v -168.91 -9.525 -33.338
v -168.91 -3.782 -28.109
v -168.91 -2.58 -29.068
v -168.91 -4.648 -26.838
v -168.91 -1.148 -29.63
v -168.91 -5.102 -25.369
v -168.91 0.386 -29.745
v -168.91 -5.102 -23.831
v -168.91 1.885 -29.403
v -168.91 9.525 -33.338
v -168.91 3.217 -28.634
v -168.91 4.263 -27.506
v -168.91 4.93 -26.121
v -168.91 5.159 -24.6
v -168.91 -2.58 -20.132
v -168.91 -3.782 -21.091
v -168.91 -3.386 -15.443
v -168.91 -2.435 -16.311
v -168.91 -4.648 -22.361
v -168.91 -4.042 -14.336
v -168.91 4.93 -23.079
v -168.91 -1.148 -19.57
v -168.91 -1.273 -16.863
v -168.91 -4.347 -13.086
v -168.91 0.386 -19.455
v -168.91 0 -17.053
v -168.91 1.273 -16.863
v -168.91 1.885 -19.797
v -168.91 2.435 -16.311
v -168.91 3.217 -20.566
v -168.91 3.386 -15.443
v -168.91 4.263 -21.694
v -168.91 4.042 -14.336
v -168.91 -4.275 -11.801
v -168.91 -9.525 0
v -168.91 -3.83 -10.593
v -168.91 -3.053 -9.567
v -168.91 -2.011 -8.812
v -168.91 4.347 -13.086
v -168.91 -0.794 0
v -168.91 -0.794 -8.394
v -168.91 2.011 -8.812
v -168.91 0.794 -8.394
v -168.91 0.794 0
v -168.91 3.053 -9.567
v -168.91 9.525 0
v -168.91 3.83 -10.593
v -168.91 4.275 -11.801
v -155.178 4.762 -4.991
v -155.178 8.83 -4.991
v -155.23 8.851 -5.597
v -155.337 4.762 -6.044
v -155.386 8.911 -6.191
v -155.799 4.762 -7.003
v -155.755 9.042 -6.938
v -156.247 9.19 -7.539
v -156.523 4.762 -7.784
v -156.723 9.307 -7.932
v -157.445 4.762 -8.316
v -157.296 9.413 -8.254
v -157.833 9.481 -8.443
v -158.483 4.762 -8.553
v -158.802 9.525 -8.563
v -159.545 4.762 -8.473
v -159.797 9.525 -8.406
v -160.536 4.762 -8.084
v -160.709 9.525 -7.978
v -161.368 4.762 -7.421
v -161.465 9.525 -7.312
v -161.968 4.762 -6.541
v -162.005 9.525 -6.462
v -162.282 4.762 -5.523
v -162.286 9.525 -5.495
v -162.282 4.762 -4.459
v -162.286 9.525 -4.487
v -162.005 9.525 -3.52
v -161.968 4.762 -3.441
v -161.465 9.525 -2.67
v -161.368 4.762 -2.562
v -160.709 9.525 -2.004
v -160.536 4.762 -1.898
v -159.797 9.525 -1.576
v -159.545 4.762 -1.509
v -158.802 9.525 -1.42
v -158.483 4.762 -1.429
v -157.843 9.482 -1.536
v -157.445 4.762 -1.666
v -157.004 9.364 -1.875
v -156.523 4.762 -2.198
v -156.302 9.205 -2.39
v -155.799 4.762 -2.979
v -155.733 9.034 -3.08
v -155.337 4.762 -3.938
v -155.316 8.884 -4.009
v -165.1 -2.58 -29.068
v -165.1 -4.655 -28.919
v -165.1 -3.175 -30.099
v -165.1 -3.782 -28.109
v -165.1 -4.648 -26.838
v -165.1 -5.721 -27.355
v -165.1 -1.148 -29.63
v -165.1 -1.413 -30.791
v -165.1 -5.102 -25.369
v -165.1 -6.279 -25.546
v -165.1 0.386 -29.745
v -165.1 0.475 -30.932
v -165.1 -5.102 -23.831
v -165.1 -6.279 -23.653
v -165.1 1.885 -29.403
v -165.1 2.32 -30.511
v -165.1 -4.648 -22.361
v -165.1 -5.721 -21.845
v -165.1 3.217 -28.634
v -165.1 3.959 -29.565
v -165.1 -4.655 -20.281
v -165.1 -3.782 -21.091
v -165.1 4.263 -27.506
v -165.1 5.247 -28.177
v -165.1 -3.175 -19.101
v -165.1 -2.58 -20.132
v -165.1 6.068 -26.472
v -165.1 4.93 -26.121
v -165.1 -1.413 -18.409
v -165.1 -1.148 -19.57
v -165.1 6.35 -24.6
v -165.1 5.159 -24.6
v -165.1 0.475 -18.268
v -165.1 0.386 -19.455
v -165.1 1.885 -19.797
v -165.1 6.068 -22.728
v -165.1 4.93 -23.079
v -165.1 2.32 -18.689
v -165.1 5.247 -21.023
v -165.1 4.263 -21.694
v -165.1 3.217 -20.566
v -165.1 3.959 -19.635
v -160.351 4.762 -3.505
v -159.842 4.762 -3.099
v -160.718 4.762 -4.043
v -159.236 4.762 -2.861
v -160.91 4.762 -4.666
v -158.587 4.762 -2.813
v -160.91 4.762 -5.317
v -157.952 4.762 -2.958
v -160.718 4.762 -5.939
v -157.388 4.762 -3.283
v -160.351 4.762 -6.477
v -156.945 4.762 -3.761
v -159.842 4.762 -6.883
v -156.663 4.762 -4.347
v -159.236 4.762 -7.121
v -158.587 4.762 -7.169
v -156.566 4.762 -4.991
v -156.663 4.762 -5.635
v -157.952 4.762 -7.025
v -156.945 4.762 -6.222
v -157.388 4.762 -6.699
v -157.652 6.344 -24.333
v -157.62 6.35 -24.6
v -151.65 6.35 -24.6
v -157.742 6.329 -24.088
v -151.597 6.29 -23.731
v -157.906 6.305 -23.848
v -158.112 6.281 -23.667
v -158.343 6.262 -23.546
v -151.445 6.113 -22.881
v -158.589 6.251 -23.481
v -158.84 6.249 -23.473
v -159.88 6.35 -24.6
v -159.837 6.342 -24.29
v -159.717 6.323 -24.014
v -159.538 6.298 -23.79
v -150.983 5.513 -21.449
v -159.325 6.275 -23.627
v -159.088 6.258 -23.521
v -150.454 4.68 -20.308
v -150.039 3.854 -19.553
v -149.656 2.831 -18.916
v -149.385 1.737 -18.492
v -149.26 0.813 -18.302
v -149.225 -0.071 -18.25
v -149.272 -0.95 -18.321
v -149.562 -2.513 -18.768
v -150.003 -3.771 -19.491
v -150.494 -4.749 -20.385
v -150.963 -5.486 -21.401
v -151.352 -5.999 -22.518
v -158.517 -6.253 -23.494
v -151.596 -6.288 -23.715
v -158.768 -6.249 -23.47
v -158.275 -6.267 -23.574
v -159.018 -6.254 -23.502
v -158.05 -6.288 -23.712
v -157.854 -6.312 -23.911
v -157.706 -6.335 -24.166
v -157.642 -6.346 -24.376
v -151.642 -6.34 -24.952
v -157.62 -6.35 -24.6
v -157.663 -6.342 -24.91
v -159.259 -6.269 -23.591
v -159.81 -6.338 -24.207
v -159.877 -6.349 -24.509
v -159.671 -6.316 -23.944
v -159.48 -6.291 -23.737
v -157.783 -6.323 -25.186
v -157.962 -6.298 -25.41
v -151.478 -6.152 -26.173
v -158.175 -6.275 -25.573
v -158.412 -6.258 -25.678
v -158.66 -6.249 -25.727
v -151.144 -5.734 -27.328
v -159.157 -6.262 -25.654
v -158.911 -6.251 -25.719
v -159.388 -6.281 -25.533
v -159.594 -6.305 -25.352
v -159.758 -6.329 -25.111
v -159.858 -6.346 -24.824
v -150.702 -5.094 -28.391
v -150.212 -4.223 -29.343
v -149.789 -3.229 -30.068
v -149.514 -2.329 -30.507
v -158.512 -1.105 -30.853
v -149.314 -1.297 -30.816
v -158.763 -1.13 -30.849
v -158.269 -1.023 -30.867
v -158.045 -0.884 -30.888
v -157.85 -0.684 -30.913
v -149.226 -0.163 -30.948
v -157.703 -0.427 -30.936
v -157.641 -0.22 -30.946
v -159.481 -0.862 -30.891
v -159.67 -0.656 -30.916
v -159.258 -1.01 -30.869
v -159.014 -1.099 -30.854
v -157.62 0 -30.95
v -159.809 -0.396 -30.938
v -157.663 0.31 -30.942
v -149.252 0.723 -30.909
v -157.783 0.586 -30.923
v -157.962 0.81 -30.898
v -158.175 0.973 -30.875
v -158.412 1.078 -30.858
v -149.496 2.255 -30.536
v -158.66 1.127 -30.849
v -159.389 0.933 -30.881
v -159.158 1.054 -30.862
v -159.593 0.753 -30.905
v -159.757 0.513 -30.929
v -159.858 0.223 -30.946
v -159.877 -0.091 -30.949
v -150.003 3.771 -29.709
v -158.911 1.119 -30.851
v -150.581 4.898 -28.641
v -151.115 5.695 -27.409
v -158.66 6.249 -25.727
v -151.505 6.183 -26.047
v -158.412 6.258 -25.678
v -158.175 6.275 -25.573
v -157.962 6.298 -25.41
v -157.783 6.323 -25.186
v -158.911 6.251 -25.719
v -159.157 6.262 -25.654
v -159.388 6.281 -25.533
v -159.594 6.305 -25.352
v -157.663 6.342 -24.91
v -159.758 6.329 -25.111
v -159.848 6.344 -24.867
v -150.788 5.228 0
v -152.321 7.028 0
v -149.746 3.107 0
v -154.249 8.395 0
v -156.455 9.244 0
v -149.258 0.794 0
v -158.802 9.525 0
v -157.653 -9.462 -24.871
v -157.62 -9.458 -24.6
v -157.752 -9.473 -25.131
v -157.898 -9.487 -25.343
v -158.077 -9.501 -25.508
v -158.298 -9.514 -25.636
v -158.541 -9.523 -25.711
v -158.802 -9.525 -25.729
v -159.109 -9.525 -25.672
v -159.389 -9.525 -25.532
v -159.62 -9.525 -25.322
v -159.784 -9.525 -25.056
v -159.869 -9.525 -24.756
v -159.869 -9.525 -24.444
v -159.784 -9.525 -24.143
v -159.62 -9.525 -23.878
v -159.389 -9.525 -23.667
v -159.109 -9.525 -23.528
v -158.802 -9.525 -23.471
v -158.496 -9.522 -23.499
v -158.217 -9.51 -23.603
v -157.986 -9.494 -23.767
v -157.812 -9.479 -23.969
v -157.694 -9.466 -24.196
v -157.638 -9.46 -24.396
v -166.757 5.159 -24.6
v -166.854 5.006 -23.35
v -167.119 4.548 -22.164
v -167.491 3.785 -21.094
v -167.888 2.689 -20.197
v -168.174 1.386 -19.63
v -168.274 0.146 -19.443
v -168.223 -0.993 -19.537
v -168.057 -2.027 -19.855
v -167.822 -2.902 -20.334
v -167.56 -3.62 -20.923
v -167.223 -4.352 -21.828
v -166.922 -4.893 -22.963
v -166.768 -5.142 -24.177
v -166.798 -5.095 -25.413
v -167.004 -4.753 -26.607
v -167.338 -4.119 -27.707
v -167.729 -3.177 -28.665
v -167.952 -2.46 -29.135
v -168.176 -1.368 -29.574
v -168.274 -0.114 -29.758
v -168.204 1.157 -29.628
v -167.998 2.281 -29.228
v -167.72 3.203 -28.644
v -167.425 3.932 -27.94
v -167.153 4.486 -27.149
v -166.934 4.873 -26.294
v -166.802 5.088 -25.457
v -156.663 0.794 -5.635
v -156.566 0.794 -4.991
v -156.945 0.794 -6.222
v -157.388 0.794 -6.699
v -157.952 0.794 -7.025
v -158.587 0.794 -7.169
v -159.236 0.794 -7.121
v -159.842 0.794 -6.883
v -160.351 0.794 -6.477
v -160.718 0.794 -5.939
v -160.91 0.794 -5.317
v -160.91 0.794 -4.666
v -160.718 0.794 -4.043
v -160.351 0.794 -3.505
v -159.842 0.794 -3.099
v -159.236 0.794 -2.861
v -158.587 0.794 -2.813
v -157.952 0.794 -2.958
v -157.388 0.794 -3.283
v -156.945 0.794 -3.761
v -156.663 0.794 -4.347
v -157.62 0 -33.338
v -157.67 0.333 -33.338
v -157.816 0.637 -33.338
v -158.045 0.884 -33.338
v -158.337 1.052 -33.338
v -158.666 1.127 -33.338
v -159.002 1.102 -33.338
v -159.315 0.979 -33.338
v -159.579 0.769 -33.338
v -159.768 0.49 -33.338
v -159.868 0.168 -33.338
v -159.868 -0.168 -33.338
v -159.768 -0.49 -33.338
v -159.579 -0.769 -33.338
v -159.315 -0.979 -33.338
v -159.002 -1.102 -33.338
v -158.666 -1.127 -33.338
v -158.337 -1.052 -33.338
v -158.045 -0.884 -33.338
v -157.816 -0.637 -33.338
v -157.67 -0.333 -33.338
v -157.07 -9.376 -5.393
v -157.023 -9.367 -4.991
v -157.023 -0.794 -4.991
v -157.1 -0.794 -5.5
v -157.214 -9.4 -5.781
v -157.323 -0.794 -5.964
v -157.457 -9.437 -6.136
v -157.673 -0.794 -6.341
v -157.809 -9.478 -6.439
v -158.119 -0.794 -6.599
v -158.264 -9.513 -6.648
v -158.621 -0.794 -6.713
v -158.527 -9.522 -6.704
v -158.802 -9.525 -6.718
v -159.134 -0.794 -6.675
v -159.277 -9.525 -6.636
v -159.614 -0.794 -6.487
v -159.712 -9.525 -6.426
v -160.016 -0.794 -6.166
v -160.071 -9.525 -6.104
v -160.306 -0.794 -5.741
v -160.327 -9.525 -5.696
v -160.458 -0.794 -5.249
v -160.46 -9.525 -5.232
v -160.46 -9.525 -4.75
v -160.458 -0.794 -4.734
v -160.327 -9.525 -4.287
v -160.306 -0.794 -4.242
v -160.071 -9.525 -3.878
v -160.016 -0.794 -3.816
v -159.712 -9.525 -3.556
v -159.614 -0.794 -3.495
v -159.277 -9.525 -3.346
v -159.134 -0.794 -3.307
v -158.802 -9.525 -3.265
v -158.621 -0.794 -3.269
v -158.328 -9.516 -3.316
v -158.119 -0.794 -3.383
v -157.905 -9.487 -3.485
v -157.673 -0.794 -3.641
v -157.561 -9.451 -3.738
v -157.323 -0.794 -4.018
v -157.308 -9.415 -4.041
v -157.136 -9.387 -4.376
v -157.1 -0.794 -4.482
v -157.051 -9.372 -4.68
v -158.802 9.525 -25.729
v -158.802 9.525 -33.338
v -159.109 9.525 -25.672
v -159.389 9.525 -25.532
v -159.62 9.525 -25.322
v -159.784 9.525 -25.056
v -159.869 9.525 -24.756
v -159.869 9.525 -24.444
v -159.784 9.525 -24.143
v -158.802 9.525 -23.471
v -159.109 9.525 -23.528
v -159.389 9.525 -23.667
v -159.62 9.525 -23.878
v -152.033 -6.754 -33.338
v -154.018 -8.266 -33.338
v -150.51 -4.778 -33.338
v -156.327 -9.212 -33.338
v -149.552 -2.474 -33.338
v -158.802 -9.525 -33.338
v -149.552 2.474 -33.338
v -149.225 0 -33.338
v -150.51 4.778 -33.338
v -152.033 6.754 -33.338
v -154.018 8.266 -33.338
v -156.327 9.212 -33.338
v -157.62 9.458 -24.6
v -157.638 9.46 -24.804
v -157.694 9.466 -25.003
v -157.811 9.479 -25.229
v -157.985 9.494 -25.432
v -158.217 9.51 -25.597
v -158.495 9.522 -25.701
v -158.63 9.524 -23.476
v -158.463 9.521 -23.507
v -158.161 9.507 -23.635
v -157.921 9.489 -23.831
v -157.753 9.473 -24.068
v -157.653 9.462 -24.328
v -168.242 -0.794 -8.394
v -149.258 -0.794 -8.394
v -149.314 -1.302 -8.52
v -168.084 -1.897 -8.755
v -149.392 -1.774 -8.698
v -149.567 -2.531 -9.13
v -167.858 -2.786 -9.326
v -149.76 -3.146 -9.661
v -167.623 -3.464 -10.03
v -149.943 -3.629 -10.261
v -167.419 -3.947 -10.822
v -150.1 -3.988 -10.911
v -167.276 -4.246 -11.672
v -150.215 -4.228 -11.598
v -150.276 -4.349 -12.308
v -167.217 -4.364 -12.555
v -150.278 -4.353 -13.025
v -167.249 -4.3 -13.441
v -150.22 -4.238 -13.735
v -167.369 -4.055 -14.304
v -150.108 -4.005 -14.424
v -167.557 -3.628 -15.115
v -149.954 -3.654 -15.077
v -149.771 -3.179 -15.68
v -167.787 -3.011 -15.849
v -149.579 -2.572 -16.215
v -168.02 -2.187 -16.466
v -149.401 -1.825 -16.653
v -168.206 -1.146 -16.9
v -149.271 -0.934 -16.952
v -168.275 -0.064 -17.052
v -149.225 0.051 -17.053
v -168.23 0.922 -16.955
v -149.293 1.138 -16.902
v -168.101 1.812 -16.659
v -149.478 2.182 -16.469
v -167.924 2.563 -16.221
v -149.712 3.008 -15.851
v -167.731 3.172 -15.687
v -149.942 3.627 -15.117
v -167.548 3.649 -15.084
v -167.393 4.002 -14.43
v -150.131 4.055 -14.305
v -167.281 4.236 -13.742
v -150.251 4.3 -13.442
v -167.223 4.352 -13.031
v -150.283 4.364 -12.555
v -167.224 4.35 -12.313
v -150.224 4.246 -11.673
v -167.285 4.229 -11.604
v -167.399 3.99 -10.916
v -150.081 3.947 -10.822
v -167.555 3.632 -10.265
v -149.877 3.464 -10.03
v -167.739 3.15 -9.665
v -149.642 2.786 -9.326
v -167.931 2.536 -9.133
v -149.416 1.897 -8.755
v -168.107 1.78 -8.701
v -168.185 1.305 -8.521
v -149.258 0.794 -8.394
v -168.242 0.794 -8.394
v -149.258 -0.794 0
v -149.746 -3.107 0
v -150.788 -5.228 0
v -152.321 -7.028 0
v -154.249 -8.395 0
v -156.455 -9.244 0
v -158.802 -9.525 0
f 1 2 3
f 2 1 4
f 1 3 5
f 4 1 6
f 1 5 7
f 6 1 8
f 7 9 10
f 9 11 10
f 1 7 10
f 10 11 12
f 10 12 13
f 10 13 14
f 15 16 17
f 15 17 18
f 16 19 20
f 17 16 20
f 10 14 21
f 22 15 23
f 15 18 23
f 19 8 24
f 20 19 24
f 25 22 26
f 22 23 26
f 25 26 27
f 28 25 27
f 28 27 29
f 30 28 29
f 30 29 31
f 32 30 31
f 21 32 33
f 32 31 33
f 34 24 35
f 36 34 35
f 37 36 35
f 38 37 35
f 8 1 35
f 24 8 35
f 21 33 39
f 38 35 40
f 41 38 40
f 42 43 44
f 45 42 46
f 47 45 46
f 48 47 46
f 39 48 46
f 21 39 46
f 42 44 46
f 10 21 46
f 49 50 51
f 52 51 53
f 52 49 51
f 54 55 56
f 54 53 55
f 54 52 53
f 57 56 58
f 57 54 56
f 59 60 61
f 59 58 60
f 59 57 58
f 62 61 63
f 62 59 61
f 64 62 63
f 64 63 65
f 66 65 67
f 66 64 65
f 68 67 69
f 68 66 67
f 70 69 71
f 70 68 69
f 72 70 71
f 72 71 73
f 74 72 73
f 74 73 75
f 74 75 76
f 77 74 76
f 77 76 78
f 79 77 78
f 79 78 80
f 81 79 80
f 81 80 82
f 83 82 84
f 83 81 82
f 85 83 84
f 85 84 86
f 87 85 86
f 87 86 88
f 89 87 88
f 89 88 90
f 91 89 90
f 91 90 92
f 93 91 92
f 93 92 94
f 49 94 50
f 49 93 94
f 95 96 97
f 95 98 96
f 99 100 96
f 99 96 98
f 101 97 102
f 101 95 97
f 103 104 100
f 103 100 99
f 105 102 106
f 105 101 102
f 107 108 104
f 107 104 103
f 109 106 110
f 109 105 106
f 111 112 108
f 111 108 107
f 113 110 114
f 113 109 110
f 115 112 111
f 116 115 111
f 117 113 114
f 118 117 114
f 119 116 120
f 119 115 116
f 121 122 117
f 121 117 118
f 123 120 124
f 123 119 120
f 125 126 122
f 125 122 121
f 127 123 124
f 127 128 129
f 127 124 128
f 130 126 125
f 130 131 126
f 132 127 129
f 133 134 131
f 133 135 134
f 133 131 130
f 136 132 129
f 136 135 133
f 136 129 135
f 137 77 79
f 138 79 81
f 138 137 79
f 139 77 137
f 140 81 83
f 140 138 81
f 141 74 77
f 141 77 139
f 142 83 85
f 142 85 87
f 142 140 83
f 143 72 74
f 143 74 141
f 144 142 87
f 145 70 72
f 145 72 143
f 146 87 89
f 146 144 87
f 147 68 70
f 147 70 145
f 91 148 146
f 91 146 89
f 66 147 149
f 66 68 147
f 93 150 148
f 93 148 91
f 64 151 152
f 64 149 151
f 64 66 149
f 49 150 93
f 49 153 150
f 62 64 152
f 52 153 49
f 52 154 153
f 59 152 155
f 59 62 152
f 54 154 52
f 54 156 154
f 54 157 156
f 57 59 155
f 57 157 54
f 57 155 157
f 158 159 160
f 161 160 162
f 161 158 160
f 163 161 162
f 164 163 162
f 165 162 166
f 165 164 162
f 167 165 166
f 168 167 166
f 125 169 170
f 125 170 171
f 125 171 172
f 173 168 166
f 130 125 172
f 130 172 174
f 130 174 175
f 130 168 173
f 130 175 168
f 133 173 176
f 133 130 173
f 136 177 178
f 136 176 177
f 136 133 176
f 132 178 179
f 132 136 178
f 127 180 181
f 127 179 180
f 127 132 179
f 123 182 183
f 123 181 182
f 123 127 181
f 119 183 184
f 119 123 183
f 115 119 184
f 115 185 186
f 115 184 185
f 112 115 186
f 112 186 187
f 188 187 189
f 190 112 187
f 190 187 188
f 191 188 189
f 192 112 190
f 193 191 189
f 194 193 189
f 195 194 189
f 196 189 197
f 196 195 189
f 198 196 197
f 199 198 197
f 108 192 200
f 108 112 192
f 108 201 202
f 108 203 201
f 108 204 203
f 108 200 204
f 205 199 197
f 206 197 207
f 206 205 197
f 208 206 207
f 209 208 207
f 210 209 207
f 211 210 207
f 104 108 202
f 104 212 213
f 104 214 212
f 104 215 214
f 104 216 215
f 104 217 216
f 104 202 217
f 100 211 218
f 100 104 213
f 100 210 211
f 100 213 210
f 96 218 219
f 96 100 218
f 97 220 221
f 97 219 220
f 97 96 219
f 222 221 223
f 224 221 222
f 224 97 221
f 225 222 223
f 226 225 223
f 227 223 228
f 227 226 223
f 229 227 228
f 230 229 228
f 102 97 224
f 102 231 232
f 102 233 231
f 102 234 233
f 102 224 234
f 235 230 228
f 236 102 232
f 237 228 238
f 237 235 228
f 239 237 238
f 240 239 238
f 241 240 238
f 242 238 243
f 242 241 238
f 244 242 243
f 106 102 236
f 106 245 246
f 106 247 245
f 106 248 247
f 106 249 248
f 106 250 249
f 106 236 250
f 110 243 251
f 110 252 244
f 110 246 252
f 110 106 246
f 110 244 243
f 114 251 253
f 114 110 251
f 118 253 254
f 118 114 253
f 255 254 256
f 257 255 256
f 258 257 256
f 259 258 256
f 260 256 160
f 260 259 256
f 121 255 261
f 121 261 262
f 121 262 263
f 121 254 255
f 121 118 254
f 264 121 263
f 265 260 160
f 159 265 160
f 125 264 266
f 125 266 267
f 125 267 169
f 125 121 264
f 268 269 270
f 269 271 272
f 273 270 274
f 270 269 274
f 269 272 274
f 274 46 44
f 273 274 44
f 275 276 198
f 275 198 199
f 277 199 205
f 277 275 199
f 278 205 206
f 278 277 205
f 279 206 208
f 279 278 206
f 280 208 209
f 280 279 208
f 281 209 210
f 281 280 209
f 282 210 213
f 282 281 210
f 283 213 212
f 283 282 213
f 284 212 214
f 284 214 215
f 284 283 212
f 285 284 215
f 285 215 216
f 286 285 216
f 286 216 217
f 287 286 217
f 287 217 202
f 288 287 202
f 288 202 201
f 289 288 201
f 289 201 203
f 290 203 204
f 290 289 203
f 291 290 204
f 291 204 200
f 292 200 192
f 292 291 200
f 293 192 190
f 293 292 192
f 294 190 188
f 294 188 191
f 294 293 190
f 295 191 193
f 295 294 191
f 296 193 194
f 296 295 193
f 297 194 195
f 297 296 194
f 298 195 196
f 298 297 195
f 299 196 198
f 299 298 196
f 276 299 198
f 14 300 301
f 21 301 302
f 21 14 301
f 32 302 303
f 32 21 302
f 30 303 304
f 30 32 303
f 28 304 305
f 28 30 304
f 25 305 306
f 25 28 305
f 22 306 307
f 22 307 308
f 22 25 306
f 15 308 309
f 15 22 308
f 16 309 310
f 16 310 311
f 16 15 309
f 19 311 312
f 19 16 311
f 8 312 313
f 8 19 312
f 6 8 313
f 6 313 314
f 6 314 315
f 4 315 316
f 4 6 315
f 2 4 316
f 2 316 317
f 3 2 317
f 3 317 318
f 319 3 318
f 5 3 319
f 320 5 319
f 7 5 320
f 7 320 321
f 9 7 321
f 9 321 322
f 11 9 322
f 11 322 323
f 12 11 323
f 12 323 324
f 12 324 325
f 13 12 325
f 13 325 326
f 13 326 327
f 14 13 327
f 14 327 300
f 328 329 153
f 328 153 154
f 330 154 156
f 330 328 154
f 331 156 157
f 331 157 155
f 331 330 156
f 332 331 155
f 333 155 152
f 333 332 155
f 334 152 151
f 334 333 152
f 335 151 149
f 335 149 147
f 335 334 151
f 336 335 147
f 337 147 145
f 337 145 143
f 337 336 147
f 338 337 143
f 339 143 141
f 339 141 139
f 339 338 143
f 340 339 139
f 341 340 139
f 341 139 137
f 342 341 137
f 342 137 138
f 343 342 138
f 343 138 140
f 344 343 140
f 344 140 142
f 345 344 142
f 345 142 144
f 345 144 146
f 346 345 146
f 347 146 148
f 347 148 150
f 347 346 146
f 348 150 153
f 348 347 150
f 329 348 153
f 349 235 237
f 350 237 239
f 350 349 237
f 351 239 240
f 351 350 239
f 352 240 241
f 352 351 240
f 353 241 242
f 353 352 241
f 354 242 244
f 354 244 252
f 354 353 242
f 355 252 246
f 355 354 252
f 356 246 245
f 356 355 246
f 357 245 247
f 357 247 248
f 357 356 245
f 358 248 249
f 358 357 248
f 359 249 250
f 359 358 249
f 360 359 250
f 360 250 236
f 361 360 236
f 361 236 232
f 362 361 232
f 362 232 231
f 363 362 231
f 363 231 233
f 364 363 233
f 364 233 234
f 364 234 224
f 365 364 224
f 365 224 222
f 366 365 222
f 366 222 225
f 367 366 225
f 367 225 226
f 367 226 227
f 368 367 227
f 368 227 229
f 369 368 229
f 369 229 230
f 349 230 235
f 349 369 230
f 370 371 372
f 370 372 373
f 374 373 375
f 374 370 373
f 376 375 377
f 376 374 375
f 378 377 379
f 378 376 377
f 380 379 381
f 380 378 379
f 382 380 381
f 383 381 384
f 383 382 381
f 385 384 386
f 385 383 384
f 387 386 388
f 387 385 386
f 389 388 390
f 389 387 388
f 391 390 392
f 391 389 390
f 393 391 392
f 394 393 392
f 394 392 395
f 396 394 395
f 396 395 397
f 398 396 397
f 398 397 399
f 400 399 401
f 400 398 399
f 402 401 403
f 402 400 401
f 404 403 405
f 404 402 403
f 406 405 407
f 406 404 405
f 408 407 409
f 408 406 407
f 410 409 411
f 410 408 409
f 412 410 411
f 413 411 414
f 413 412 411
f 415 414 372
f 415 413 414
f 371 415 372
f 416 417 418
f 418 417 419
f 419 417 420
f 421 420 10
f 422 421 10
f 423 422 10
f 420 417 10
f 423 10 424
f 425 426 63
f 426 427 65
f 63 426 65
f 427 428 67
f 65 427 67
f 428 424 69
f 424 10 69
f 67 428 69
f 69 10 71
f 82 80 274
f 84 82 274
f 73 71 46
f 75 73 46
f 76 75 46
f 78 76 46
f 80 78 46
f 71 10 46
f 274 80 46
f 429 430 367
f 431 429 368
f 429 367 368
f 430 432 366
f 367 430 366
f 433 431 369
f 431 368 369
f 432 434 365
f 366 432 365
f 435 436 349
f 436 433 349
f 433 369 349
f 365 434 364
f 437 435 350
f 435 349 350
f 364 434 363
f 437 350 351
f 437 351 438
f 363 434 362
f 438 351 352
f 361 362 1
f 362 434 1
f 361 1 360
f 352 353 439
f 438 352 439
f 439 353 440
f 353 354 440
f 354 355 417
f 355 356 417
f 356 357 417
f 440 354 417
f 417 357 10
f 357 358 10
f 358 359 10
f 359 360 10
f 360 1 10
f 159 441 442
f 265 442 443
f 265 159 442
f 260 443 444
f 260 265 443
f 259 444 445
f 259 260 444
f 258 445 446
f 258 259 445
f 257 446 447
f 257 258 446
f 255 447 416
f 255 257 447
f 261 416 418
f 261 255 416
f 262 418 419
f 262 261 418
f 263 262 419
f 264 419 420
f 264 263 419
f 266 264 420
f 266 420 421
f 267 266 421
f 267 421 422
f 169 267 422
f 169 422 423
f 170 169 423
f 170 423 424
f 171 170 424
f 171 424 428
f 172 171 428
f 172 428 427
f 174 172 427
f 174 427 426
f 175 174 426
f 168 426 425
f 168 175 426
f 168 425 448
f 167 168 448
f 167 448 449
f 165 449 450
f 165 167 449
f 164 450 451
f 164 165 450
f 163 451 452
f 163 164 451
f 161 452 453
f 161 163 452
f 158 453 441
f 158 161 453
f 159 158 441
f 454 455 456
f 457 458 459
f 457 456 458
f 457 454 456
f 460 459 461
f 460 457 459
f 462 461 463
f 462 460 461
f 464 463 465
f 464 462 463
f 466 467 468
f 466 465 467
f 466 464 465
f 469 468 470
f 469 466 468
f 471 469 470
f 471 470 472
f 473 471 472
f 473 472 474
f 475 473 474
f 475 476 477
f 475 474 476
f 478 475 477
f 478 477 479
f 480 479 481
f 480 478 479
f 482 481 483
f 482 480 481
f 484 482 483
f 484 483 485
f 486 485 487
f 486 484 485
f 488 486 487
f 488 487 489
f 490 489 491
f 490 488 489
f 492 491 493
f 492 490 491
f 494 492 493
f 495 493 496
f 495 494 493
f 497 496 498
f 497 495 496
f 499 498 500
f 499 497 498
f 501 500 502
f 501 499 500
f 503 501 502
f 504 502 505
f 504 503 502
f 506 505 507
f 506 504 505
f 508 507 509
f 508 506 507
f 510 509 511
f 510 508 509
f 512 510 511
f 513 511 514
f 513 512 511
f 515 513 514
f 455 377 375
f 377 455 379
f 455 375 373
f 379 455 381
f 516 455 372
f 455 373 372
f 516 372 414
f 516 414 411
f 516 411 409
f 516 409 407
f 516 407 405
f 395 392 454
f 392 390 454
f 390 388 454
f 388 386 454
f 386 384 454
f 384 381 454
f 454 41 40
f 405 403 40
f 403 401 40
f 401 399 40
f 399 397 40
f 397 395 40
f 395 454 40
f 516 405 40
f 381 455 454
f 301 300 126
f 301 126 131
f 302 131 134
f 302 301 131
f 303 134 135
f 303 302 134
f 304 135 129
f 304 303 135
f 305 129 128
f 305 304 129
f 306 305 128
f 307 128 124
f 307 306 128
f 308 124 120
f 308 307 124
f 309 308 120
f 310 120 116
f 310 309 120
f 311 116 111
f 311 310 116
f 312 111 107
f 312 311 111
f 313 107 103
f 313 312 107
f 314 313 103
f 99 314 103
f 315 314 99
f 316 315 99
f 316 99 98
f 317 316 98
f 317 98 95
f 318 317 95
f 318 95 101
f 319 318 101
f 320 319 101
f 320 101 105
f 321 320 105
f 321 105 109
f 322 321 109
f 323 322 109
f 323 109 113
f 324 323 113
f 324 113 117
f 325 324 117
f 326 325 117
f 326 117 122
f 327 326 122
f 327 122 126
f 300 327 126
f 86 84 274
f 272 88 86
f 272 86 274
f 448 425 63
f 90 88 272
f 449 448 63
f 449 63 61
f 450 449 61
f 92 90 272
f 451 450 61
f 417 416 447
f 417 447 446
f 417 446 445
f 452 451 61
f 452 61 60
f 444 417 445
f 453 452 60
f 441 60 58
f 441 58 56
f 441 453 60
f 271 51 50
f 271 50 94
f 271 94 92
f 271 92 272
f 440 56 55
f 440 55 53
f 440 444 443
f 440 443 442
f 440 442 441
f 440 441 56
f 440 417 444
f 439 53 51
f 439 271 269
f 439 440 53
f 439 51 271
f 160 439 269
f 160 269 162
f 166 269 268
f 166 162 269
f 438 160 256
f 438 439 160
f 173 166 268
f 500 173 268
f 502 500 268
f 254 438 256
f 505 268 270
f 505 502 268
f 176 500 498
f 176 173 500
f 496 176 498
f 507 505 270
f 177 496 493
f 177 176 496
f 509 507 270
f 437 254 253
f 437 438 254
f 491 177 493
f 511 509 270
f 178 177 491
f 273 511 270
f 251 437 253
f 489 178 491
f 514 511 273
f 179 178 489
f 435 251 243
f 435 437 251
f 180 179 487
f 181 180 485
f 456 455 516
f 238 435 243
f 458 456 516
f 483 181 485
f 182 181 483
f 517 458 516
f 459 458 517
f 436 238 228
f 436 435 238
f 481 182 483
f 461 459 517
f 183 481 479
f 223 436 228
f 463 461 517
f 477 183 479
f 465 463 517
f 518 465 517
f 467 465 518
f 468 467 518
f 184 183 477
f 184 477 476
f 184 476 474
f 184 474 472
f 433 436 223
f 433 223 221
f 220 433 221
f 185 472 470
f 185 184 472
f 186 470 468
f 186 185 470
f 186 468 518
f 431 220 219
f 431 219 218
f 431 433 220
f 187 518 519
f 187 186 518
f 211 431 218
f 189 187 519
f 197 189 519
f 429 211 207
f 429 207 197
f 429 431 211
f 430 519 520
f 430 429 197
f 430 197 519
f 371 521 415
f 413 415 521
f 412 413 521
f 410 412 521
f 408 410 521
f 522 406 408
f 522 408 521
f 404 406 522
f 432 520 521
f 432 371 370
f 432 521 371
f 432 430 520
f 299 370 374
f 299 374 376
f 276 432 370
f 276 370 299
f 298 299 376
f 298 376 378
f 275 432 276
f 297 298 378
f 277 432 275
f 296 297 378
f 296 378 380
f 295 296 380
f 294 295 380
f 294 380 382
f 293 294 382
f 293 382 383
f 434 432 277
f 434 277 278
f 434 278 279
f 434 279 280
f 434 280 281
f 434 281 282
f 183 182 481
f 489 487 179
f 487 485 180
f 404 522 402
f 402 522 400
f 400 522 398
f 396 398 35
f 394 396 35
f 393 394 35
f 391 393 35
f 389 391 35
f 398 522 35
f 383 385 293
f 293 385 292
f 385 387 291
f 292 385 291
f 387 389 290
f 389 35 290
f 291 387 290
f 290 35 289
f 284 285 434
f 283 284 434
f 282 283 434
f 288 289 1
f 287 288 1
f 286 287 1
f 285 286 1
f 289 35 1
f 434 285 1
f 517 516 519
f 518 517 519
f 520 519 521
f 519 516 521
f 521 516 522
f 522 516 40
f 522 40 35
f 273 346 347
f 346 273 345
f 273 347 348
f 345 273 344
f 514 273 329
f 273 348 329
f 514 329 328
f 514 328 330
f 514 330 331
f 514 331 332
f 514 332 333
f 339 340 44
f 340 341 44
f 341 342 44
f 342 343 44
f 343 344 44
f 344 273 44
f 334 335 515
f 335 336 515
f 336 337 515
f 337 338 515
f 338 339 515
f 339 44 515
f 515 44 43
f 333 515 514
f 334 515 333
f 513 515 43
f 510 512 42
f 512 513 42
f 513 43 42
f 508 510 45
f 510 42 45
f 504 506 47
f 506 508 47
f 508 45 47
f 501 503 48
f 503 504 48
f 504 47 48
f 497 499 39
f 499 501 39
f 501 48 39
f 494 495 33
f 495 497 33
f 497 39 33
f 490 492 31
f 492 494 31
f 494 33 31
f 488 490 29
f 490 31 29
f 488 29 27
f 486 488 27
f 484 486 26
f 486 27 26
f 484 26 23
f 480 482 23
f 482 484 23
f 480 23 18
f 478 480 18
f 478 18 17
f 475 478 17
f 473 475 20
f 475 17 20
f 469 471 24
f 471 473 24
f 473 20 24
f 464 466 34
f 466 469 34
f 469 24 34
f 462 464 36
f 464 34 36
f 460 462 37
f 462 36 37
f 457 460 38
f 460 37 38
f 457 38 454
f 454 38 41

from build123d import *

# Parameters (mm, degrees)
SKETCH1_W              = 9.525
SKETCH1_H              = 33.3375
COMBINE1_START         = -165.1
COMBINE1_OUTLINE_R     = 6.35
COMBINE1_DEPTH         = 17.1
COMBINE1_START_2       = -168.91
COMBINE1_2_OUTLINE_R   = 5.159375
COMBINE1_2_DEPTH       = 3.81
COMBINE1_3_OUTLINE_R   = 6.35
COMBINE1_3_DEPTH       = 10.107803
COMBINE1_4_OUTLINE_R   = 6.35
COMBINE1_4_OUTLINE_R_2 = 5.159375
COMBINE1_4_DEPTH       = 3.81
COMBINE1_START_3       = 4.7625
COMBINE1_5_OUTLINE_R   = 3.571875
COMBINE1_5_OUTLINE_R_2 = 1.1303
COMBINE1_5_DEPTH       = 4.7625
COMBINE1_START_4       = -11
COMBINE1_6_OUTLINE_R   = 1.7272
COMBINE1_6_OUTLINE_R_2 = 1.1303
COMBINE1_6_DEPTH       = 15.7625
COMBINE1_START_5       = 0.793749963
COMBINE1_7_OUTLINE_R   = 2.1844
COMBINE1_7_OUTLINE_R_2 = 1.7272
COMBINE1_7_DEPTH       = 3.968750037
COMBINE1_START_6       = -33.3375
COMBINE1_8_OUTLINE_R   = 1.1303
COMBINE1_8_DEPTH       = 2.48900636


with BuildPart() as part:
    # Sketch1 → Revolve1 (revolve)
    with BuildSketch(Plane(origin=(0, 0, 0), x_dir=(1, 0, 0), z_dir=(0, 1, 0))):
        with Locations((-153.9875, 16.66875)):
            Rectangle(SKETCH1_W, SKETCH1_H)
    revolve(axis=Axis((-158.75, 0, 0), (0, 0, -1)))

    # Combine1: read off the stored shape, not the designer's step
    # Combine1 outline → Combine1 (cut)
    with BuildSketch(Plane.YZ.offset(COMBINE1_START)):
        with BuildLine():
            Line((0.79375, 0), (-0.79375, 0))
            Line((-0.79375, 0), (-0.793749936, -8.394440501))
            ThreePointArc((-0.793749936, -8.394440501), (-1e-08, -17.052925), (0.793749959, -8.394440505))
            Line((0.793749959, -8.394440505), (0.79375, 0))
        make_face()
        with Locations((0, -24.5999)):
            Circle(COMBINE1_OUTLINE_R)
    extrude(amount=COMBINE1_DEPTH, mode=Mode.SUBTRACT)

    # Combine1 2 outline → Combine1 2 (cut)
    with BuildSketch(Plane.YZ.offset(COMBINE1_START_2)):
        with BuildLine():
            Line((0.79375, 0), (-0.79375, 0))
            Line((-0.79375, 0), (-0.793749936, -8.394440501))
            ThreePointArc((-0.793749936, -8.394440501), (-1e-08, -17.052925), (0.793749959, -8.394440505))
            Line((0.793749959, -8.394440505), (0.79375, 0))
        make_face()
        with Locations((0, -24.5999)):
            Circle(COMBINE1_2_OUTLINE_R)
    extrude(amount=COMBINE1_2_DEPTH, mode=Mode.SUBTRACT)

    # Combine1 3 outline → Combine1 3 (add)
    with BuildSketch(Plane.YZ.offset(COMBINE1_START_2)):
        with BuildLine():
            Line((-0.79375, 0), (-9.525, 0))
            Line((-9.525, 0), (-9.525, -33.3375))
            Line((-9.525, -33.3375), (9.525, -33.3375))
            Line((9.525, -33.3375), (9.525, 0))
            Line((9.525, 0), (0.79375, 0))
            Line((0.79375, 0), (0.793749959, -8.394440505))
            ThreePointArc((0.793749959, -8.394440505), (-1e-08, -17.052925), (-0.793749936, -8.394440501))
            Line((-0.793749936, -8.394440501), (-0.79375, 0))
        make_face()
        with Locations((0, -24.5999)):
            Circle(COMBINE1_3_OUTLINE_R, mode=Mode.SUBTRACT)
    extrude(amount=COMBINE1_3_DEPTH)

    # Combine1 4 outline → Combine1 4 (add)
    with BuildSketch(Plane.YZ.offset(COMBINE1_START_2)):
        with Locations((0, -24.5999)):
            Circle(COMBINE1_4_OUTLINE_R)
        with Locations((0, -24.5999)):
            Circle(COMBINE1_4_OUTLINE_R_2, mode=Mode.SUBTRACT)
    extrude(amount=COMBINE1_4_DEPTH)

    # Combine1 5 outline → Combine1 5 (cut)
    with BuildSketch(Plane(origin=(0, 0, 0), x_dir=(1, 0, 0), z_dir=(0, 1, 0)).offset(COMBINE1_START_3)):
        with Locations((-158.75, 4.9911)):
            Circle(COMBINE1_5_OUTLINE_R)
        with Locations((-158.75, 24.5999)):
            Circle(COMBINE1_5_OUTLINE_R_2)
    extrude(amount=COMBINE1_5_DEPTH, mode=Mode.SUBTRACT)

    # Combine1 6 outline → Combine1 6 (cut)
    with BuildSketch(Plane(origin=(0, 0, 0), x_dir=(1, 0, 0), z_dir=(0, 1, 0)).offset(COMBINE1_START_4)):
        with Locations((-158.75, 4.9911)):
            Circle(COMBINE1_6_OUTLINE_R)
        with Locations((-158.75, 24.5999)):
            Circle(COMBINE1_6_OUTLINE_R_2)
    extrude(amount=COMBINE1_6_DEPTH, mode=Mode.SUBTRACT)

    # Combine1 7 outline → Combine1 7 (cut)
    with BuildSketch(Plane(origin=(0, 0, 0), x_dir=(1, 0, 0), z_dir=(0, 1, 0)).offset(COMBINE1_START_5)):
        with Locations((-158.75, 4.9911)):
            Circle(COMBINE1_7_OUTLINE_R)
        with Locations((-158.75, 4.9911)):
            Circle(COMBINE1_7_OUTLINE_R_2, mode=Mode.SUBTRACT)
    extrude(amount=COMBINE1_7_DEPTH, mode=Mode.SUBTRACT)

    # Combine1 8 outline → Combine1 8 (cut)
    with BuildSketch(Plane.XY.offset(COMBINE1_START_6)):
        with Locations((-158.75, 0)):
            Circle(COMBINE1_8_OUTLINE_R)
    extrude(amount=COMBINE1_8_DEPTH, mode=Mode.SUBTRACT)


solid = part.part
